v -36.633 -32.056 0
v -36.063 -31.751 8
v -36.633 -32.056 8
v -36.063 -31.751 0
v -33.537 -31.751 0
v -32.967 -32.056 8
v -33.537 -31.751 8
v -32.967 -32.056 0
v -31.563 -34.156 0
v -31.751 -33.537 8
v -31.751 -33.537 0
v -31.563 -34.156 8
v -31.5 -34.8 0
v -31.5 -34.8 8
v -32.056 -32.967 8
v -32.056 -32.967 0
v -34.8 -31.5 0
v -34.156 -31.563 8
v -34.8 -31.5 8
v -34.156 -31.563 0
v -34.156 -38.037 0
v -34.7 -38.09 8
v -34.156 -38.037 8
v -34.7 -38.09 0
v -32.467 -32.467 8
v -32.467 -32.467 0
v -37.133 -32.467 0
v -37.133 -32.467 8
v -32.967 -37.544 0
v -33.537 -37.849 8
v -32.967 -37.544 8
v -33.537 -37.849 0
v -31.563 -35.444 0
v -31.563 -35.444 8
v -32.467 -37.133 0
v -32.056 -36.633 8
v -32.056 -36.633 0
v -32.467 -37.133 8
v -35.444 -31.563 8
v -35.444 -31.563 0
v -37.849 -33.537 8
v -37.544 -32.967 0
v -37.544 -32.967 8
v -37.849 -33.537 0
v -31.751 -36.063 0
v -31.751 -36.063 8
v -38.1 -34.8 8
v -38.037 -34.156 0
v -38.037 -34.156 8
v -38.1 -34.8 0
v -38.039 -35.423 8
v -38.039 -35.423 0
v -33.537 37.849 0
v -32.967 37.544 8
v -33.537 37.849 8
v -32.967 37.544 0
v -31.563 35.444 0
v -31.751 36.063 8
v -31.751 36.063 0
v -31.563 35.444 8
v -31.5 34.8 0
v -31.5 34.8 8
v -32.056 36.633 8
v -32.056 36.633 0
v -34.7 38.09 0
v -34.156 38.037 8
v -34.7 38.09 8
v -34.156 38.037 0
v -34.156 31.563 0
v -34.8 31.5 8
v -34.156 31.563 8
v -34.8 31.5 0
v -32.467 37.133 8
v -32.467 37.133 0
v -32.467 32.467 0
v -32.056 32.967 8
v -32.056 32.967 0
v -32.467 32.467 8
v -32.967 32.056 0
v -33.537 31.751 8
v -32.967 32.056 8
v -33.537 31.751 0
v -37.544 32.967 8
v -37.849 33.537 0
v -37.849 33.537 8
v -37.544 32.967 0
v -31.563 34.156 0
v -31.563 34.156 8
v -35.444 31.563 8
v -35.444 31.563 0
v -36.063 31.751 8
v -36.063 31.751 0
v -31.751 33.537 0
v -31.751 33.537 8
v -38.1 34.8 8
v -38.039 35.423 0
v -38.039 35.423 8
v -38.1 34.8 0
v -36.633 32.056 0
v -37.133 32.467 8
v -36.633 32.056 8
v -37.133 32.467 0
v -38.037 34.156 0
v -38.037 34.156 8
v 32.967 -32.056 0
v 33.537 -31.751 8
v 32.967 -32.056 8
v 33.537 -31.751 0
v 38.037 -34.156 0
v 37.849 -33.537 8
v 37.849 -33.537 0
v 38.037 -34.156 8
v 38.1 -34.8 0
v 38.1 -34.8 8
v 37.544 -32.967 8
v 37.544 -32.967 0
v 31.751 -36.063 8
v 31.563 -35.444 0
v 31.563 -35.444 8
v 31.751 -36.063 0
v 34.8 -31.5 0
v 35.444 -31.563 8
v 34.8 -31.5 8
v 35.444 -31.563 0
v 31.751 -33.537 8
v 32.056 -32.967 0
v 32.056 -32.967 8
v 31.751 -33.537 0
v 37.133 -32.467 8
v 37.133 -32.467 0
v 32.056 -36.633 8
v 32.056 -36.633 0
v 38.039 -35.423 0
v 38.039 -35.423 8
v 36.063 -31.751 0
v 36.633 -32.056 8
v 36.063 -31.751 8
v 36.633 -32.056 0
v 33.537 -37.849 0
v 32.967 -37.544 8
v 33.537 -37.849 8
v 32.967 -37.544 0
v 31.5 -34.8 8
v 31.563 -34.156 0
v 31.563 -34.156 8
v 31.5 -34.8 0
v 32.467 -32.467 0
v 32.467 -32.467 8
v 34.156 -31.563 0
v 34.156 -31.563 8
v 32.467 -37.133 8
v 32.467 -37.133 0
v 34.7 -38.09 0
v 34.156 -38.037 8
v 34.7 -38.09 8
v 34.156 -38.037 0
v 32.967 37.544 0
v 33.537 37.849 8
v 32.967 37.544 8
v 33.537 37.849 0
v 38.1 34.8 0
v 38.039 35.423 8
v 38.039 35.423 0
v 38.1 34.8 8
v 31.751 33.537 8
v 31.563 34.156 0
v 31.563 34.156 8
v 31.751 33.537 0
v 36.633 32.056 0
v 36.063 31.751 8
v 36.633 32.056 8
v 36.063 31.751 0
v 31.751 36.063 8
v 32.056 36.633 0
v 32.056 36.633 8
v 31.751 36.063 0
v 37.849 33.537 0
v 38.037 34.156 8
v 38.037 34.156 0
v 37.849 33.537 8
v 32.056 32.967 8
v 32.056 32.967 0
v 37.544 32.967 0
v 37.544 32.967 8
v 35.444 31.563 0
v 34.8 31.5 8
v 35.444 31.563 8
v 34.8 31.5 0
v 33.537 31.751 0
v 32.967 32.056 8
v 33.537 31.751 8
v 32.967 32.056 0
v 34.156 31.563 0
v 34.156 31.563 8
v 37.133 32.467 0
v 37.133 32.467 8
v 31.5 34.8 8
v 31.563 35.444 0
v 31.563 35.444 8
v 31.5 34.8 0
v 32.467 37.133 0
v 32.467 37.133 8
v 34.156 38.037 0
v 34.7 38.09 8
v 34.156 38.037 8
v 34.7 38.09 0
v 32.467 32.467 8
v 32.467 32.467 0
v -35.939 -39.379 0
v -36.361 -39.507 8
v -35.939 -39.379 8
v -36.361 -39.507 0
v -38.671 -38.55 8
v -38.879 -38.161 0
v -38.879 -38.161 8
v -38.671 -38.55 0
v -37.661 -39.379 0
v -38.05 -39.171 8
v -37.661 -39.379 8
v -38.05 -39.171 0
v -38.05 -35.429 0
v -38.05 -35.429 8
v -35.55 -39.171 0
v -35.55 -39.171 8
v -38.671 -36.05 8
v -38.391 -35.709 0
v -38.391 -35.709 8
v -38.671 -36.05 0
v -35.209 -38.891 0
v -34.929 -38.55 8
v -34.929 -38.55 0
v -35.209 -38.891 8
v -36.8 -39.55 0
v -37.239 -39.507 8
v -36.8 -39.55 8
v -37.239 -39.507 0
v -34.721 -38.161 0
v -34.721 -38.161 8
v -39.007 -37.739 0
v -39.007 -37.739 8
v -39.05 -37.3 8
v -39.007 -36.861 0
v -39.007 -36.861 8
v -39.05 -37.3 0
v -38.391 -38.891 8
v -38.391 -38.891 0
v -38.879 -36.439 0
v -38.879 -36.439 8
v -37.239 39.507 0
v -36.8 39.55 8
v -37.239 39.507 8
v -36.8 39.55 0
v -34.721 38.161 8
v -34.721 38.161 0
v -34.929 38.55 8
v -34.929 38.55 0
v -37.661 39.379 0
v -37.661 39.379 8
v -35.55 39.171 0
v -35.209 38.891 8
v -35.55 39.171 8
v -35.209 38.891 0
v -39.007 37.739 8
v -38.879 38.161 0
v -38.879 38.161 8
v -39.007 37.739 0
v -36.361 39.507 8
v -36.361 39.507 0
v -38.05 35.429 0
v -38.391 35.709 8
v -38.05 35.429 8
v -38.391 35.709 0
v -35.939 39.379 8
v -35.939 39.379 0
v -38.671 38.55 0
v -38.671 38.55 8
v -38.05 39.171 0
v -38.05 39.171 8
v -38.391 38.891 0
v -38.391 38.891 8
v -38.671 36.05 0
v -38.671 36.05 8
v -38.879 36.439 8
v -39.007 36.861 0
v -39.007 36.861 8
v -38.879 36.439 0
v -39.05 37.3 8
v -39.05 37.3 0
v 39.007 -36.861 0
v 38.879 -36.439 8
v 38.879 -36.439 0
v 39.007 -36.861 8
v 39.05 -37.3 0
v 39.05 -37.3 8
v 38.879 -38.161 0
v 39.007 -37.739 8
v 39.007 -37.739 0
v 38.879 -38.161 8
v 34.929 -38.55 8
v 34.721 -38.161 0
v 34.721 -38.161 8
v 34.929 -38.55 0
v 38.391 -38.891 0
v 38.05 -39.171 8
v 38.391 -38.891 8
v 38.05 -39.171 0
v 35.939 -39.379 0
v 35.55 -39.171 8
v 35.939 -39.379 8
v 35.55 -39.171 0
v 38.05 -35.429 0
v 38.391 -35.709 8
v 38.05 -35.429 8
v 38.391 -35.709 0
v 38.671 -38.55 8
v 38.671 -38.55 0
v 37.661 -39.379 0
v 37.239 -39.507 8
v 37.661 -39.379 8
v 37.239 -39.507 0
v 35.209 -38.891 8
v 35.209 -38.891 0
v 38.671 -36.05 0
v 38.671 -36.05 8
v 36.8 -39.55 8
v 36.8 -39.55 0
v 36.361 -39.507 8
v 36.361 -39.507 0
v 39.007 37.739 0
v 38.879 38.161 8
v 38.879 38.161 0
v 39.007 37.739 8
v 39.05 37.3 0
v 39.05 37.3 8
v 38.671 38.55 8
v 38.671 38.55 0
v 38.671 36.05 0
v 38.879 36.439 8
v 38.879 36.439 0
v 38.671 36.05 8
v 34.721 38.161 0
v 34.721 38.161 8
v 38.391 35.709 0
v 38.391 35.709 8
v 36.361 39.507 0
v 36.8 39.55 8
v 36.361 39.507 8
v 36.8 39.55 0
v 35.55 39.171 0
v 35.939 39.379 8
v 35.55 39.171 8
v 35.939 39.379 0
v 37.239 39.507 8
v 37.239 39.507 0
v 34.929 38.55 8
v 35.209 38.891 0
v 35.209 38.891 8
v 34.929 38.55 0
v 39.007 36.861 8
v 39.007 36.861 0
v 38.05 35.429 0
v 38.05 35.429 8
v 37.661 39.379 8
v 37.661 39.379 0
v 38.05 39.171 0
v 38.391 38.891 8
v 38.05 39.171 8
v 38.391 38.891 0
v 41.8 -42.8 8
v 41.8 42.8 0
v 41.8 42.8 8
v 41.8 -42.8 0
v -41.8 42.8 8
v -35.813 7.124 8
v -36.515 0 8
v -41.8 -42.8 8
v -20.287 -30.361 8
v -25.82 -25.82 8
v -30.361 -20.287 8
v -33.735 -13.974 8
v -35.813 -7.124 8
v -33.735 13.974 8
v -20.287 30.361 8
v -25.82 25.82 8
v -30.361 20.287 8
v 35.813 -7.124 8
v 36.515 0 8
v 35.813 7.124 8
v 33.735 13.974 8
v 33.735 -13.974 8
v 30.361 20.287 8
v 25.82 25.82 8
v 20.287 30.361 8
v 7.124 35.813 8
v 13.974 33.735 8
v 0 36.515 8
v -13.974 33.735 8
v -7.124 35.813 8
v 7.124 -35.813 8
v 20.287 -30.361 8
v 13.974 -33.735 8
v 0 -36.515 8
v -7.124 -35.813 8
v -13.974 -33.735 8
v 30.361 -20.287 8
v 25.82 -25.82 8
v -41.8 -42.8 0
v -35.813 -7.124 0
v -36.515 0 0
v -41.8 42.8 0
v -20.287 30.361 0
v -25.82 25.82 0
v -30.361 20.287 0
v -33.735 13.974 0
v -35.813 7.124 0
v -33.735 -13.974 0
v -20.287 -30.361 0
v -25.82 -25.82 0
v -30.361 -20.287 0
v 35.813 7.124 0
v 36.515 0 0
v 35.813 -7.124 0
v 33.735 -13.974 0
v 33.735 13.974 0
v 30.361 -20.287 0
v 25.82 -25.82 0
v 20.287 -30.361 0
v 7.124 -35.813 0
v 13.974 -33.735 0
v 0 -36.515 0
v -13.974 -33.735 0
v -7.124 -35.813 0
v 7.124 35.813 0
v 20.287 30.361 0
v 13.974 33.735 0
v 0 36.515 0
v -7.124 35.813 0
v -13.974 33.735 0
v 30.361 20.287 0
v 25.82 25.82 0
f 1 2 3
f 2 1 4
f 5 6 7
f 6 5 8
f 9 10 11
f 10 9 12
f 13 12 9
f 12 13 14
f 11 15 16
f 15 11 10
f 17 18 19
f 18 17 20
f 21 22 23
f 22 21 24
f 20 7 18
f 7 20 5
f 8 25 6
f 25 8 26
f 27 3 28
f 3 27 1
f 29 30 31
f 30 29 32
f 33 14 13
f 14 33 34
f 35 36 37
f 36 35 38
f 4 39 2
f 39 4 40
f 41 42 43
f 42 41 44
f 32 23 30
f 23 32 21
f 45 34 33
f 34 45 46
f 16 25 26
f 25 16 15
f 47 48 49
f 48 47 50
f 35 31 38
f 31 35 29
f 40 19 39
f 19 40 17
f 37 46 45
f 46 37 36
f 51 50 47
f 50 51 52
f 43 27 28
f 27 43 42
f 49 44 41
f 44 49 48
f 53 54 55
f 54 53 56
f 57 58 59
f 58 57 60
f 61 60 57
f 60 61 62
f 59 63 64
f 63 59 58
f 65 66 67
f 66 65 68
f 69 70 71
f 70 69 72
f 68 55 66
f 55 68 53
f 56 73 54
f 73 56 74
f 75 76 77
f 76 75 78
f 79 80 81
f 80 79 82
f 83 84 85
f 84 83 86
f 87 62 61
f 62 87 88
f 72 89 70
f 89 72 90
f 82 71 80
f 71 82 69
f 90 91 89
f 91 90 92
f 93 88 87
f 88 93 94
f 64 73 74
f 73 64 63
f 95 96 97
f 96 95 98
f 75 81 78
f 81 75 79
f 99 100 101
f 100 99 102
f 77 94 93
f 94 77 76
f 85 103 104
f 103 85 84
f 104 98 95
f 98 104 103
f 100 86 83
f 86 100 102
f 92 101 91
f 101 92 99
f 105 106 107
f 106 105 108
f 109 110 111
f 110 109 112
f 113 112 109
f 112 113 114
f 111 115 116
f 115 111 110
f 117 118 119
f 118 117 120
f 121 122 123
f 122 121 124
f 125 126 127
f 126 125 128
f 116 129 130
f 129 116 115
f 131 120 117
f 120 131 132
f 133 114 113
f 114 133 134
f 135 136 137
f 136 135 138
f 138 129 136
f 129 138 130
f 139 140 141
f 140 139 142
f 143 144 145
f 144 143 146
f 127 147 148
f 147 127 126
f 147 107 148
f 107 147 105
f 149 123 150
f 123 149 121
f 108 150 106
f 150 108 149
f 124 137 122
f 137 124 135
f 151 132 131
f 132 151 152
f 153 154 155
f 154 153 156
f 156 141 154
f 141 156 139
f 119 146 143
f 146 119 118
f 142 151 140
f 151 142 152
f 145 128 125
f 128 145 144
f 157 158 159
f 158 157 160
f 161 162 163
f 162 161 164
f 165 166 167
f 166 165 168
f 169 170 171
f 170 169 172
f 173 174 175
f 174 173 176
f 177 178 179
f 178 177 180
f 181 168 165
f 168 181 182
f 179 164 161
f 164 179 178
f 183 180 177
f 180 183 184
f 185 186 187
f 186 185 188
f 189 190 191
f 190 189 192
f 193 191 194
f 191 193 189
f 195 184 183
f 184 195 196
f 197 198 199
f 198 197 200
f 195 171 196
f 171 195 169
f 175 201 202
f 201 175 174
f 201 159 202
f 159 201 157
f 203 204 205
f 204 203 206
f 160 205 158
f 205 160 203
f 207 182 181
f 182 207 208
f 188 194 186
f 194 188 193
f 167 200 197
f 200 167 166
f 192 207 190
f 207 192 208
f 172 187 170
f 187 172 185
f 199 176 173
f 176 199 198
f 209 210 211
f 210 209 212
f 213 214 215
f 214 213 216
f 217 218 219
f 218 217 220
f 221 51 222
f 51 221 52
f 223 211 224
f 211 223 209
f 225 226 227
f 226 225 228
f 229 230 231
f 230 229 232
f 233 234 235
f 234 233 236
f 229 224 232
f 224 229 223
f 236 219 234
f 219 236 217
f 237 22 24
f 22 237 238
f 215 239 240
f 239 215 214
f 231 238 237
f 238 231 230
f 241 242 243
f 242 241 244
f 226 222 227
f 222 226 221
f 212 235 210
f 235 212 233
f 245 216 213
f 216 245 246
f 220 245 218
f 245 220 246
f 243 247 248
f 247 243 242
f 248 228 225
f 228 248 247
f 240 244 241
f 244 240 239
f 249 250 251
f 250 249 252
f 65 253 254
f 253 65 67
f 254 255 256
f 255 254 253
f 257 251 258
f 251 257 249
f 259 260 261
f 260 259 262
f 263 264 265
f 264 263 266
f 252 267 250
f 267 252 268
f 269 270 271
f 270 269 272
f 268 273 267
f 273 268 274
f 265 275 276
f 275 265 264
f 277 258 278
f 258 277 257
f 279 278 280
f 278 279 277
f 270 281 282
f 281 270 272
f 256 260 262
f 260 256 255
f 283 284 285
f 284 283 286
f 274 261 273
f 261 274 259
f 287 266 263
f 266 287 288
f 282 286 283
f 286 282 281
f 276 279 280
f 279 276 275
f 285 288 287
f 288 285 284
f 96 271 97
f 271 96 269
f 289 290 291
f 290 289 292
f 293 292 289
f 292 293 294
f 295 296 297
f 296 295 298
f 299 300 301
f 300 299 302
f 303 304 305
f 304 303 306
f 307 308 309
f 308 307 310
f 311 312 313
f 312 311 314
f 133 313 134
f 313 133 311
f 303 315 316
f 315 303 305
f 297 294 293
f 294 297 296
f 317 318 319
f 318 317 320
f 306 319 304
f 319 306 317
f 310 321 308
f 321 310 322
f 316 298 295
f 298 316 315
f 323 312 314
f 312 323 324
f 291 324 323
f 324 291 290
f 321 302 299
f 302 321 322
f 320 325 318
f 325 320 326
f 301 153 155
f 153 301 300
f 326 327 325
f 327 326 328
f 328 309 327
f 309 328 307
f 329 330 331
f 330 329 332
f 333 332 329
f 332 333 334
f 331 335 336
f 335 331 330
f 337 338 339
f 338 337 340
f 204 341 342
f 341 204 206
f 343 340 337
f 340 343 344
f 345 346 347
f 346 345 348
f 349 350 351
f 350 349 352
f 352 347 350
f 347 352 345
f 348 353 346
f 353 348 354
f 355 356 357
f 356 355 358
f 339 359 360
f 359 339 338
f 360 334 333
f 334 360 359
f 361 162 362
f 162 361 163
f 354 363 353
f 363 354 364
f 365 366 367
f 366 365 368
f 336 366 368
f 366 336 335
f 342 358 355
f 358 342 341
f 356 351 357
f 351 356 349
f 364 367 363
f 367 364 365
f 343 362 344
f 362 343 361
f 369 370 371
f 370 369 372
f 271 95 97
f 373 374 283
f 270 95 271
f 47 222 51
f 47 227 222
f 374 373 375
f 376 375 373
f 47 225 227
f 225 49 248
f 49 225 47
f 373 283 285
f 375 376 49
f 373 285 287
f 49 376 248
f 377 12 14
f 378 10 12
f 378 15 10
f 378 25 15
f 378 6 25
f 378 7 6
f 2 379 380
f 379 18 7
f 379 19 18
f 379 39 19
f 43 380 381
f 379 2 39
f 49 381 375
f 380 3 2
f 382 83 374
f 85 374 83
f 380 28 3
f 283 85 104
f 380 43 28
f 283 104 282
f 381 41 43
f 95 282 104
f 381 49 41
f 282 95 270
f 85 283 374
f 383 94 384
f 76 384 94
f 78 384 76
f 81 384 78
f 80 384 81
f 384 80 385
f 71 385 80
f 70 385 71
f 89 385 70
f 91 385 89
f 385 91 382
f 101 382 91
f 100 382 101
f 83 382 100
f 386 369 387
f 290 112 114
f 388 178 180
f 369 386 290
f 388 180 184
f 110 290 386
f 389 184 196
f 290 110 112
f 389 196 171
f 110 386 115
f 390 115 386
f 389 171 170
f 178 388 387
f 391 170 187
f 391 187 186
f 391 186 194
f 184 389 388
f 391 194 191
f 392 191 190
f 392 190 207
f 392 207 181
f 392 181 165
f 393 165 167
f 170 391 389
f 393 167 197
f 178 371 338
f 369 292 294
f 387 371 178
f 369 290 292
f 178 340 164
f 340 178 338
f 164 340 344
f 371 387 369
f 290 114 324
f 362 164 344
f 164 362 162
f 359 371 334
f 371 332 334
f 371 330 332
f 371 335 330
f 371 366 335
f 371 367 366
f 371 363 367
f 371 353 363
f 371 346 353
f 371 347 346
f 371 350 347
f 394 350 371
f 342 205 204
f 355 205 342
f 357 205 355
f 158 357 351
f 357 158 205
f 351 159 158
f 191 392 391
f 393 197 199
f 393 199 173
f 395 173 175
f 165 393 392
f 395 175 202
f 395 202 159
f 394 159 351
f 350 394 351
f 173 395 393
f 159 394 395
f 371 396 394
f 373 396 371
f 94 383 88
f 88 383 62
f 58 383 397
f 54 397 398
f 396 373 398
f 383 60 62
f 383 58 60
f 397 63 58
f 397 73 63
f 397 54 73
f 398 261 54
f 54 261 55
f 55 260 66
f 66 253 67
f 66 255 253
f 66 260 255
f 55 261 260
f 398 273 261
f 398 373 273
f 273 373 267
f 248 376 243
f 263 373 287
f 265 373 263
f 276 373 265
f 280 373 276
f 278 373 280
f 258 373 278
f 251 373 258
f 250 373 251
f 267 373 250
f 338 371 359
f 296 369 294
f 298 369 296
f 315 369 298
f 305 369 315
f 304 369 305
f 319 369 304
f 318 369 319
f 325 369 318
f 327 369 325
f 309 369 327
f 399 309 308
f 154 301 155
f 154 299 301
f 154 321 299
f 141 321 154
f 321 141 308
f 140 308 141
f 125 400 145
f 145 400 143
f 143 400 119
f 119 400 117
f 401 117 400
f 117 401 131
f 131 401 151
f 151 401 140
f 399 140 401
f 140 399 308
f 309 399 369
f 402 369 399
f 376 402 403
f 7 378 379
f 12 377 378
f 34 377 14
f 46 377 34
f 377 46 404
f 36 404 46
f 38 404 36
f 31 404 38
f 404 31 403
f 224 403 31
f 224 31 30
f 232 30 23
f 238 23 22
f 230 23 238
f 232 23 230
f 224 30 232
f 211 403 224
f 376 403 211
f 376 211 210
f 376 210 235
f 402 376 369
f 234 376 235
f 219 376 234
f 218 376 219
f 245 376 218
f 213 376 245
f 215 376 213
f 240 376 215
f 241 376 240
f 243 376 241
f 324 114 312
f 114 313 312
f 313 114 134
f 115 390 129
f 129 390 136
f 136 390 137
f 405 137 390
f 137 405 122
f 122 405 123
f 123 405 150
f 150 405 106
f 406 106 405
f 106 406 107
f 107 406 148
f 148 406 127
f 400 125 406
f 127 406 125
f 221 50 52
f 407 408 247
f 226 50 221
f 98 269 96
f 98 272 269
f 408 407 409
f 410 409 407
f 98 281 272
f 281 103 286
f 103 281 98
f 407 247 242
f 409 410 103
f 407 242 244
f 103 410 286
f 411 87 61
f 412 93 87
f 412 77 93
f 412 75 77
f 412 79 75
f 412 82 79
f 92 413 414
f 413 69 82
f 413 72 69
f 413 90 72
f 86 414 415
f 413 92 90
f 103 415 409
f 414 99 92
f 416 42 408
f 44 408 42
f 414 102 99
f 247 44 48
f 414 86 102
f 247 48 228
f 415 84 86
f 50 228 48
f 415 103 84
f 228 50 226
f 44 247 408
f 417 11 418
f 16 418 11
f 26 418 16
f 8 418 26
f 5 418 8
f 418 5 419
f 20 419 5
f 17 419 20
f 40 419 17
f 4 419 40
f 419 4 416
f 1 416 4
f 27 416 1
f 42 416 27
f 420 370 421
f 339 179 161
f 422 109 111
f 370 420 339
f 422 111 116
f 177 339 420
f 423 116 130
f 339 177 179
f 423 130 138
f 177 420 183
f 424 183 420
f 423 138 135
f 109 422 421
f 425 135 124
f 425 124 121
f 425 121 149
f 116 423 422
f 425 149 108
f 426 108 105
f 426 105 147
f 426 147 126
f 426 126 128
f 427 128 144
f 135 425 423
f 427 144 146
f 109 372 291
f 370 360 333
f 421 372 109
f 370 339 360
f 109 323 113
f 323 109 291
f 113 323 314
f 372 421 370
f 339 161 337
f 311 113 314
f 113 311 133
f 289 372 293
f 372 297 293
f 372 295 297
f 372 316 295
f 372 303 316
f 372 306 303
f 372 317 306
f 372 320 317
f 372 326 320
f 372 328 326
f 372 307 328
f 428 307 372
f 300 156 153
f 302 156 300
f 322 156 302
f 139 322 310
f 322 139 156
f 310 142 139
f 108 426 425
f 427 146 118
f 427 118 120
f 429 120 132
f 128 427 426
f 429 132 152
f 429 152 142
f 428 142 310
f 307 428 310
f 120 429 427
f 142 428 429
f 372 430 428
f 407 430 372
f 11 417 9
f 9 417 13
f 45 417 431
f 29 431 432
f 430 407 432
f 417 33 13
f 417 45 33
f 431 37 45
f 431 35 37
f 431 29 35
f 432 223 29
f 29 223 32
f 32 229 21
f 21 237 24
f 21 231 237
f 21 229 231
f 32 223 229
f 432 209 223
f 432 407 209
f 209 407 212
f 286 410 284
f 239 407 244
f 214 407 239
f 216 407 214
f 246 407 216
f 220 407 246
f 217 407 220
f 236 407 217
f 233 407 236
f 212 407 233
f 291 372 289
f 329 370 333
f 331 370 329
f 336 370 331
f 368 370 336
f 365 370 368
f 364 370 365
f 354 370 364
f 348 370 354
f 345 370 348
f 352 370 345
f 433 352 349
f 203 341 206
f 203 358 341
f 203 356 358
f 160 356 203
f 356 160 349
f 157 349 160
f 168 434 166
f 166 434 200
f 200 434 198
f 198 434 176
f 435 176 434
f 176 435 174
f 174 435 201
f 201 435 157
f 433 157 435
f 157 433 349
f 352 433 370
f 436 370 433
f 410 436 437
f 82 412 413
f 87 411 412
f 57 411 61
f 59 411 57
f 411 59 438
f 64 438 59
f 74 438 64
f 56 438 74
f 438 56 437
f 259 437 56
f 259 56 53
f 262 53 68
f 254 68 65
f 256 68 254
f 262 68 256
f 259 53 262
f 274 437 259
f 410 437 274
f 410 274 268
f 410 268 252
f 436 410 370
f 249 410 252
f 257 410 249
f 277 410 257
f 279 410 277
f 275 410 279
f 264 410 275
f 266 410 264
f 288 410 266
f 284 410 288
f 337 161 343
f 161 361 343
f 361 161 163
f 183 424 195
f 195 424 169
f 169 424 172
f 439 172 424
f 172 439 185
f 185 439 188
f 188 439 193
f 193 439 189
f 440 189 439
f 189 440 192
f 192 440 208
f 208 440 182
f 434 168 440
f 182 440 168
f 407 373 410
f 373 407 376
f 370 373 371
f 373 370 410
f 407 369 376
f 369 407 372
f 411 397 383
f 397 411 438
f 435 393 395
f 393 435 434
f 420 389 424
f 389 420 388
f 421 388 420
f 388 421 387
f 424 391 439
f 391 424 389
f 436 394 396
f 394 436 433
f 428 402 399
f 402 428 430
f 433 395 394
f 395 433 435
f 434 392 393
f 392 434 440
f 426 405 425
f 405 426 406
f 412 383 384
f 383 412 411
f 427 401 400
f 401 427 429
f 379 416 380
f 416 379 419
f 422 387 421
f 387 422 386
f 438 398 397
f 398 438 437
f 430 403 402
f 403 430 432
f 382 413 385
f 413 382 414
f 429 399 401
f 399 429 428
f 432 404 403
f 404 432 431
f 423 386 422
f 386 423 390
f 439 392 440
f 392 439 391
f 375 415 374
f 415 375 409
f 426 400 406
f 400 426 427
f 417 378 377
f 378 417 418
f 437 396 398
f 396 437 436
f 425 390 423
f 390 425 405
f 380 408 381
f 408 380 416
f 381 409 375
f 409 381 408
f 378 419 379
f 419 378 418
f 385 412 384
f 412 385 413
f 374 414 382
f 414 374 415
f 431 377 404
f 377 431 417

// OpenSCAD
$fn = 32;

// ----------------------------------------------------------------------
// Motor mount plate: NEMA34, 83.6 x 85.6 x 8 mm
// ----------------------------------------------------------------------

// --- parameters (mm) ---
base_x = 83.6;            // plate length, X
base_y = 85.6;            // plate width, Y
thick = 8;                // plate thickness
bolt_pitch = 69.6;        // NEMA34 bolt spacing
motor_d = 6.6;            // NEMA34 screw clearance
boss_hole = 73.03;        // pilot boss bore
second_d = 4.5;           // second fastener hole

module plate() {
  translate([-base_x / 2, -base_y / 2, 0]) cube([base_x, base_y, thick]);
}

module motor_holes() {
  for (sx = [-1, 1]) for (sy = [-1, 1])
    translate([sx * bolt_pitch / 2, sy * bolt_pitch / 2, -1])
      cylinder(h = thick + 2, d = motor_d);
}

difference() {
  union() {
    plate();
  }
  motor_holes();
  translate([0, 0, -1]) cylinder(h = thick + 2, d = boss_hole);
  for (sx = [-1, 1]) for (sy = [-1, 1])
    translate([sx * 36.8, sy * 37.3, -1]) cylinder(h = thick + 2, d = second_d);
}
